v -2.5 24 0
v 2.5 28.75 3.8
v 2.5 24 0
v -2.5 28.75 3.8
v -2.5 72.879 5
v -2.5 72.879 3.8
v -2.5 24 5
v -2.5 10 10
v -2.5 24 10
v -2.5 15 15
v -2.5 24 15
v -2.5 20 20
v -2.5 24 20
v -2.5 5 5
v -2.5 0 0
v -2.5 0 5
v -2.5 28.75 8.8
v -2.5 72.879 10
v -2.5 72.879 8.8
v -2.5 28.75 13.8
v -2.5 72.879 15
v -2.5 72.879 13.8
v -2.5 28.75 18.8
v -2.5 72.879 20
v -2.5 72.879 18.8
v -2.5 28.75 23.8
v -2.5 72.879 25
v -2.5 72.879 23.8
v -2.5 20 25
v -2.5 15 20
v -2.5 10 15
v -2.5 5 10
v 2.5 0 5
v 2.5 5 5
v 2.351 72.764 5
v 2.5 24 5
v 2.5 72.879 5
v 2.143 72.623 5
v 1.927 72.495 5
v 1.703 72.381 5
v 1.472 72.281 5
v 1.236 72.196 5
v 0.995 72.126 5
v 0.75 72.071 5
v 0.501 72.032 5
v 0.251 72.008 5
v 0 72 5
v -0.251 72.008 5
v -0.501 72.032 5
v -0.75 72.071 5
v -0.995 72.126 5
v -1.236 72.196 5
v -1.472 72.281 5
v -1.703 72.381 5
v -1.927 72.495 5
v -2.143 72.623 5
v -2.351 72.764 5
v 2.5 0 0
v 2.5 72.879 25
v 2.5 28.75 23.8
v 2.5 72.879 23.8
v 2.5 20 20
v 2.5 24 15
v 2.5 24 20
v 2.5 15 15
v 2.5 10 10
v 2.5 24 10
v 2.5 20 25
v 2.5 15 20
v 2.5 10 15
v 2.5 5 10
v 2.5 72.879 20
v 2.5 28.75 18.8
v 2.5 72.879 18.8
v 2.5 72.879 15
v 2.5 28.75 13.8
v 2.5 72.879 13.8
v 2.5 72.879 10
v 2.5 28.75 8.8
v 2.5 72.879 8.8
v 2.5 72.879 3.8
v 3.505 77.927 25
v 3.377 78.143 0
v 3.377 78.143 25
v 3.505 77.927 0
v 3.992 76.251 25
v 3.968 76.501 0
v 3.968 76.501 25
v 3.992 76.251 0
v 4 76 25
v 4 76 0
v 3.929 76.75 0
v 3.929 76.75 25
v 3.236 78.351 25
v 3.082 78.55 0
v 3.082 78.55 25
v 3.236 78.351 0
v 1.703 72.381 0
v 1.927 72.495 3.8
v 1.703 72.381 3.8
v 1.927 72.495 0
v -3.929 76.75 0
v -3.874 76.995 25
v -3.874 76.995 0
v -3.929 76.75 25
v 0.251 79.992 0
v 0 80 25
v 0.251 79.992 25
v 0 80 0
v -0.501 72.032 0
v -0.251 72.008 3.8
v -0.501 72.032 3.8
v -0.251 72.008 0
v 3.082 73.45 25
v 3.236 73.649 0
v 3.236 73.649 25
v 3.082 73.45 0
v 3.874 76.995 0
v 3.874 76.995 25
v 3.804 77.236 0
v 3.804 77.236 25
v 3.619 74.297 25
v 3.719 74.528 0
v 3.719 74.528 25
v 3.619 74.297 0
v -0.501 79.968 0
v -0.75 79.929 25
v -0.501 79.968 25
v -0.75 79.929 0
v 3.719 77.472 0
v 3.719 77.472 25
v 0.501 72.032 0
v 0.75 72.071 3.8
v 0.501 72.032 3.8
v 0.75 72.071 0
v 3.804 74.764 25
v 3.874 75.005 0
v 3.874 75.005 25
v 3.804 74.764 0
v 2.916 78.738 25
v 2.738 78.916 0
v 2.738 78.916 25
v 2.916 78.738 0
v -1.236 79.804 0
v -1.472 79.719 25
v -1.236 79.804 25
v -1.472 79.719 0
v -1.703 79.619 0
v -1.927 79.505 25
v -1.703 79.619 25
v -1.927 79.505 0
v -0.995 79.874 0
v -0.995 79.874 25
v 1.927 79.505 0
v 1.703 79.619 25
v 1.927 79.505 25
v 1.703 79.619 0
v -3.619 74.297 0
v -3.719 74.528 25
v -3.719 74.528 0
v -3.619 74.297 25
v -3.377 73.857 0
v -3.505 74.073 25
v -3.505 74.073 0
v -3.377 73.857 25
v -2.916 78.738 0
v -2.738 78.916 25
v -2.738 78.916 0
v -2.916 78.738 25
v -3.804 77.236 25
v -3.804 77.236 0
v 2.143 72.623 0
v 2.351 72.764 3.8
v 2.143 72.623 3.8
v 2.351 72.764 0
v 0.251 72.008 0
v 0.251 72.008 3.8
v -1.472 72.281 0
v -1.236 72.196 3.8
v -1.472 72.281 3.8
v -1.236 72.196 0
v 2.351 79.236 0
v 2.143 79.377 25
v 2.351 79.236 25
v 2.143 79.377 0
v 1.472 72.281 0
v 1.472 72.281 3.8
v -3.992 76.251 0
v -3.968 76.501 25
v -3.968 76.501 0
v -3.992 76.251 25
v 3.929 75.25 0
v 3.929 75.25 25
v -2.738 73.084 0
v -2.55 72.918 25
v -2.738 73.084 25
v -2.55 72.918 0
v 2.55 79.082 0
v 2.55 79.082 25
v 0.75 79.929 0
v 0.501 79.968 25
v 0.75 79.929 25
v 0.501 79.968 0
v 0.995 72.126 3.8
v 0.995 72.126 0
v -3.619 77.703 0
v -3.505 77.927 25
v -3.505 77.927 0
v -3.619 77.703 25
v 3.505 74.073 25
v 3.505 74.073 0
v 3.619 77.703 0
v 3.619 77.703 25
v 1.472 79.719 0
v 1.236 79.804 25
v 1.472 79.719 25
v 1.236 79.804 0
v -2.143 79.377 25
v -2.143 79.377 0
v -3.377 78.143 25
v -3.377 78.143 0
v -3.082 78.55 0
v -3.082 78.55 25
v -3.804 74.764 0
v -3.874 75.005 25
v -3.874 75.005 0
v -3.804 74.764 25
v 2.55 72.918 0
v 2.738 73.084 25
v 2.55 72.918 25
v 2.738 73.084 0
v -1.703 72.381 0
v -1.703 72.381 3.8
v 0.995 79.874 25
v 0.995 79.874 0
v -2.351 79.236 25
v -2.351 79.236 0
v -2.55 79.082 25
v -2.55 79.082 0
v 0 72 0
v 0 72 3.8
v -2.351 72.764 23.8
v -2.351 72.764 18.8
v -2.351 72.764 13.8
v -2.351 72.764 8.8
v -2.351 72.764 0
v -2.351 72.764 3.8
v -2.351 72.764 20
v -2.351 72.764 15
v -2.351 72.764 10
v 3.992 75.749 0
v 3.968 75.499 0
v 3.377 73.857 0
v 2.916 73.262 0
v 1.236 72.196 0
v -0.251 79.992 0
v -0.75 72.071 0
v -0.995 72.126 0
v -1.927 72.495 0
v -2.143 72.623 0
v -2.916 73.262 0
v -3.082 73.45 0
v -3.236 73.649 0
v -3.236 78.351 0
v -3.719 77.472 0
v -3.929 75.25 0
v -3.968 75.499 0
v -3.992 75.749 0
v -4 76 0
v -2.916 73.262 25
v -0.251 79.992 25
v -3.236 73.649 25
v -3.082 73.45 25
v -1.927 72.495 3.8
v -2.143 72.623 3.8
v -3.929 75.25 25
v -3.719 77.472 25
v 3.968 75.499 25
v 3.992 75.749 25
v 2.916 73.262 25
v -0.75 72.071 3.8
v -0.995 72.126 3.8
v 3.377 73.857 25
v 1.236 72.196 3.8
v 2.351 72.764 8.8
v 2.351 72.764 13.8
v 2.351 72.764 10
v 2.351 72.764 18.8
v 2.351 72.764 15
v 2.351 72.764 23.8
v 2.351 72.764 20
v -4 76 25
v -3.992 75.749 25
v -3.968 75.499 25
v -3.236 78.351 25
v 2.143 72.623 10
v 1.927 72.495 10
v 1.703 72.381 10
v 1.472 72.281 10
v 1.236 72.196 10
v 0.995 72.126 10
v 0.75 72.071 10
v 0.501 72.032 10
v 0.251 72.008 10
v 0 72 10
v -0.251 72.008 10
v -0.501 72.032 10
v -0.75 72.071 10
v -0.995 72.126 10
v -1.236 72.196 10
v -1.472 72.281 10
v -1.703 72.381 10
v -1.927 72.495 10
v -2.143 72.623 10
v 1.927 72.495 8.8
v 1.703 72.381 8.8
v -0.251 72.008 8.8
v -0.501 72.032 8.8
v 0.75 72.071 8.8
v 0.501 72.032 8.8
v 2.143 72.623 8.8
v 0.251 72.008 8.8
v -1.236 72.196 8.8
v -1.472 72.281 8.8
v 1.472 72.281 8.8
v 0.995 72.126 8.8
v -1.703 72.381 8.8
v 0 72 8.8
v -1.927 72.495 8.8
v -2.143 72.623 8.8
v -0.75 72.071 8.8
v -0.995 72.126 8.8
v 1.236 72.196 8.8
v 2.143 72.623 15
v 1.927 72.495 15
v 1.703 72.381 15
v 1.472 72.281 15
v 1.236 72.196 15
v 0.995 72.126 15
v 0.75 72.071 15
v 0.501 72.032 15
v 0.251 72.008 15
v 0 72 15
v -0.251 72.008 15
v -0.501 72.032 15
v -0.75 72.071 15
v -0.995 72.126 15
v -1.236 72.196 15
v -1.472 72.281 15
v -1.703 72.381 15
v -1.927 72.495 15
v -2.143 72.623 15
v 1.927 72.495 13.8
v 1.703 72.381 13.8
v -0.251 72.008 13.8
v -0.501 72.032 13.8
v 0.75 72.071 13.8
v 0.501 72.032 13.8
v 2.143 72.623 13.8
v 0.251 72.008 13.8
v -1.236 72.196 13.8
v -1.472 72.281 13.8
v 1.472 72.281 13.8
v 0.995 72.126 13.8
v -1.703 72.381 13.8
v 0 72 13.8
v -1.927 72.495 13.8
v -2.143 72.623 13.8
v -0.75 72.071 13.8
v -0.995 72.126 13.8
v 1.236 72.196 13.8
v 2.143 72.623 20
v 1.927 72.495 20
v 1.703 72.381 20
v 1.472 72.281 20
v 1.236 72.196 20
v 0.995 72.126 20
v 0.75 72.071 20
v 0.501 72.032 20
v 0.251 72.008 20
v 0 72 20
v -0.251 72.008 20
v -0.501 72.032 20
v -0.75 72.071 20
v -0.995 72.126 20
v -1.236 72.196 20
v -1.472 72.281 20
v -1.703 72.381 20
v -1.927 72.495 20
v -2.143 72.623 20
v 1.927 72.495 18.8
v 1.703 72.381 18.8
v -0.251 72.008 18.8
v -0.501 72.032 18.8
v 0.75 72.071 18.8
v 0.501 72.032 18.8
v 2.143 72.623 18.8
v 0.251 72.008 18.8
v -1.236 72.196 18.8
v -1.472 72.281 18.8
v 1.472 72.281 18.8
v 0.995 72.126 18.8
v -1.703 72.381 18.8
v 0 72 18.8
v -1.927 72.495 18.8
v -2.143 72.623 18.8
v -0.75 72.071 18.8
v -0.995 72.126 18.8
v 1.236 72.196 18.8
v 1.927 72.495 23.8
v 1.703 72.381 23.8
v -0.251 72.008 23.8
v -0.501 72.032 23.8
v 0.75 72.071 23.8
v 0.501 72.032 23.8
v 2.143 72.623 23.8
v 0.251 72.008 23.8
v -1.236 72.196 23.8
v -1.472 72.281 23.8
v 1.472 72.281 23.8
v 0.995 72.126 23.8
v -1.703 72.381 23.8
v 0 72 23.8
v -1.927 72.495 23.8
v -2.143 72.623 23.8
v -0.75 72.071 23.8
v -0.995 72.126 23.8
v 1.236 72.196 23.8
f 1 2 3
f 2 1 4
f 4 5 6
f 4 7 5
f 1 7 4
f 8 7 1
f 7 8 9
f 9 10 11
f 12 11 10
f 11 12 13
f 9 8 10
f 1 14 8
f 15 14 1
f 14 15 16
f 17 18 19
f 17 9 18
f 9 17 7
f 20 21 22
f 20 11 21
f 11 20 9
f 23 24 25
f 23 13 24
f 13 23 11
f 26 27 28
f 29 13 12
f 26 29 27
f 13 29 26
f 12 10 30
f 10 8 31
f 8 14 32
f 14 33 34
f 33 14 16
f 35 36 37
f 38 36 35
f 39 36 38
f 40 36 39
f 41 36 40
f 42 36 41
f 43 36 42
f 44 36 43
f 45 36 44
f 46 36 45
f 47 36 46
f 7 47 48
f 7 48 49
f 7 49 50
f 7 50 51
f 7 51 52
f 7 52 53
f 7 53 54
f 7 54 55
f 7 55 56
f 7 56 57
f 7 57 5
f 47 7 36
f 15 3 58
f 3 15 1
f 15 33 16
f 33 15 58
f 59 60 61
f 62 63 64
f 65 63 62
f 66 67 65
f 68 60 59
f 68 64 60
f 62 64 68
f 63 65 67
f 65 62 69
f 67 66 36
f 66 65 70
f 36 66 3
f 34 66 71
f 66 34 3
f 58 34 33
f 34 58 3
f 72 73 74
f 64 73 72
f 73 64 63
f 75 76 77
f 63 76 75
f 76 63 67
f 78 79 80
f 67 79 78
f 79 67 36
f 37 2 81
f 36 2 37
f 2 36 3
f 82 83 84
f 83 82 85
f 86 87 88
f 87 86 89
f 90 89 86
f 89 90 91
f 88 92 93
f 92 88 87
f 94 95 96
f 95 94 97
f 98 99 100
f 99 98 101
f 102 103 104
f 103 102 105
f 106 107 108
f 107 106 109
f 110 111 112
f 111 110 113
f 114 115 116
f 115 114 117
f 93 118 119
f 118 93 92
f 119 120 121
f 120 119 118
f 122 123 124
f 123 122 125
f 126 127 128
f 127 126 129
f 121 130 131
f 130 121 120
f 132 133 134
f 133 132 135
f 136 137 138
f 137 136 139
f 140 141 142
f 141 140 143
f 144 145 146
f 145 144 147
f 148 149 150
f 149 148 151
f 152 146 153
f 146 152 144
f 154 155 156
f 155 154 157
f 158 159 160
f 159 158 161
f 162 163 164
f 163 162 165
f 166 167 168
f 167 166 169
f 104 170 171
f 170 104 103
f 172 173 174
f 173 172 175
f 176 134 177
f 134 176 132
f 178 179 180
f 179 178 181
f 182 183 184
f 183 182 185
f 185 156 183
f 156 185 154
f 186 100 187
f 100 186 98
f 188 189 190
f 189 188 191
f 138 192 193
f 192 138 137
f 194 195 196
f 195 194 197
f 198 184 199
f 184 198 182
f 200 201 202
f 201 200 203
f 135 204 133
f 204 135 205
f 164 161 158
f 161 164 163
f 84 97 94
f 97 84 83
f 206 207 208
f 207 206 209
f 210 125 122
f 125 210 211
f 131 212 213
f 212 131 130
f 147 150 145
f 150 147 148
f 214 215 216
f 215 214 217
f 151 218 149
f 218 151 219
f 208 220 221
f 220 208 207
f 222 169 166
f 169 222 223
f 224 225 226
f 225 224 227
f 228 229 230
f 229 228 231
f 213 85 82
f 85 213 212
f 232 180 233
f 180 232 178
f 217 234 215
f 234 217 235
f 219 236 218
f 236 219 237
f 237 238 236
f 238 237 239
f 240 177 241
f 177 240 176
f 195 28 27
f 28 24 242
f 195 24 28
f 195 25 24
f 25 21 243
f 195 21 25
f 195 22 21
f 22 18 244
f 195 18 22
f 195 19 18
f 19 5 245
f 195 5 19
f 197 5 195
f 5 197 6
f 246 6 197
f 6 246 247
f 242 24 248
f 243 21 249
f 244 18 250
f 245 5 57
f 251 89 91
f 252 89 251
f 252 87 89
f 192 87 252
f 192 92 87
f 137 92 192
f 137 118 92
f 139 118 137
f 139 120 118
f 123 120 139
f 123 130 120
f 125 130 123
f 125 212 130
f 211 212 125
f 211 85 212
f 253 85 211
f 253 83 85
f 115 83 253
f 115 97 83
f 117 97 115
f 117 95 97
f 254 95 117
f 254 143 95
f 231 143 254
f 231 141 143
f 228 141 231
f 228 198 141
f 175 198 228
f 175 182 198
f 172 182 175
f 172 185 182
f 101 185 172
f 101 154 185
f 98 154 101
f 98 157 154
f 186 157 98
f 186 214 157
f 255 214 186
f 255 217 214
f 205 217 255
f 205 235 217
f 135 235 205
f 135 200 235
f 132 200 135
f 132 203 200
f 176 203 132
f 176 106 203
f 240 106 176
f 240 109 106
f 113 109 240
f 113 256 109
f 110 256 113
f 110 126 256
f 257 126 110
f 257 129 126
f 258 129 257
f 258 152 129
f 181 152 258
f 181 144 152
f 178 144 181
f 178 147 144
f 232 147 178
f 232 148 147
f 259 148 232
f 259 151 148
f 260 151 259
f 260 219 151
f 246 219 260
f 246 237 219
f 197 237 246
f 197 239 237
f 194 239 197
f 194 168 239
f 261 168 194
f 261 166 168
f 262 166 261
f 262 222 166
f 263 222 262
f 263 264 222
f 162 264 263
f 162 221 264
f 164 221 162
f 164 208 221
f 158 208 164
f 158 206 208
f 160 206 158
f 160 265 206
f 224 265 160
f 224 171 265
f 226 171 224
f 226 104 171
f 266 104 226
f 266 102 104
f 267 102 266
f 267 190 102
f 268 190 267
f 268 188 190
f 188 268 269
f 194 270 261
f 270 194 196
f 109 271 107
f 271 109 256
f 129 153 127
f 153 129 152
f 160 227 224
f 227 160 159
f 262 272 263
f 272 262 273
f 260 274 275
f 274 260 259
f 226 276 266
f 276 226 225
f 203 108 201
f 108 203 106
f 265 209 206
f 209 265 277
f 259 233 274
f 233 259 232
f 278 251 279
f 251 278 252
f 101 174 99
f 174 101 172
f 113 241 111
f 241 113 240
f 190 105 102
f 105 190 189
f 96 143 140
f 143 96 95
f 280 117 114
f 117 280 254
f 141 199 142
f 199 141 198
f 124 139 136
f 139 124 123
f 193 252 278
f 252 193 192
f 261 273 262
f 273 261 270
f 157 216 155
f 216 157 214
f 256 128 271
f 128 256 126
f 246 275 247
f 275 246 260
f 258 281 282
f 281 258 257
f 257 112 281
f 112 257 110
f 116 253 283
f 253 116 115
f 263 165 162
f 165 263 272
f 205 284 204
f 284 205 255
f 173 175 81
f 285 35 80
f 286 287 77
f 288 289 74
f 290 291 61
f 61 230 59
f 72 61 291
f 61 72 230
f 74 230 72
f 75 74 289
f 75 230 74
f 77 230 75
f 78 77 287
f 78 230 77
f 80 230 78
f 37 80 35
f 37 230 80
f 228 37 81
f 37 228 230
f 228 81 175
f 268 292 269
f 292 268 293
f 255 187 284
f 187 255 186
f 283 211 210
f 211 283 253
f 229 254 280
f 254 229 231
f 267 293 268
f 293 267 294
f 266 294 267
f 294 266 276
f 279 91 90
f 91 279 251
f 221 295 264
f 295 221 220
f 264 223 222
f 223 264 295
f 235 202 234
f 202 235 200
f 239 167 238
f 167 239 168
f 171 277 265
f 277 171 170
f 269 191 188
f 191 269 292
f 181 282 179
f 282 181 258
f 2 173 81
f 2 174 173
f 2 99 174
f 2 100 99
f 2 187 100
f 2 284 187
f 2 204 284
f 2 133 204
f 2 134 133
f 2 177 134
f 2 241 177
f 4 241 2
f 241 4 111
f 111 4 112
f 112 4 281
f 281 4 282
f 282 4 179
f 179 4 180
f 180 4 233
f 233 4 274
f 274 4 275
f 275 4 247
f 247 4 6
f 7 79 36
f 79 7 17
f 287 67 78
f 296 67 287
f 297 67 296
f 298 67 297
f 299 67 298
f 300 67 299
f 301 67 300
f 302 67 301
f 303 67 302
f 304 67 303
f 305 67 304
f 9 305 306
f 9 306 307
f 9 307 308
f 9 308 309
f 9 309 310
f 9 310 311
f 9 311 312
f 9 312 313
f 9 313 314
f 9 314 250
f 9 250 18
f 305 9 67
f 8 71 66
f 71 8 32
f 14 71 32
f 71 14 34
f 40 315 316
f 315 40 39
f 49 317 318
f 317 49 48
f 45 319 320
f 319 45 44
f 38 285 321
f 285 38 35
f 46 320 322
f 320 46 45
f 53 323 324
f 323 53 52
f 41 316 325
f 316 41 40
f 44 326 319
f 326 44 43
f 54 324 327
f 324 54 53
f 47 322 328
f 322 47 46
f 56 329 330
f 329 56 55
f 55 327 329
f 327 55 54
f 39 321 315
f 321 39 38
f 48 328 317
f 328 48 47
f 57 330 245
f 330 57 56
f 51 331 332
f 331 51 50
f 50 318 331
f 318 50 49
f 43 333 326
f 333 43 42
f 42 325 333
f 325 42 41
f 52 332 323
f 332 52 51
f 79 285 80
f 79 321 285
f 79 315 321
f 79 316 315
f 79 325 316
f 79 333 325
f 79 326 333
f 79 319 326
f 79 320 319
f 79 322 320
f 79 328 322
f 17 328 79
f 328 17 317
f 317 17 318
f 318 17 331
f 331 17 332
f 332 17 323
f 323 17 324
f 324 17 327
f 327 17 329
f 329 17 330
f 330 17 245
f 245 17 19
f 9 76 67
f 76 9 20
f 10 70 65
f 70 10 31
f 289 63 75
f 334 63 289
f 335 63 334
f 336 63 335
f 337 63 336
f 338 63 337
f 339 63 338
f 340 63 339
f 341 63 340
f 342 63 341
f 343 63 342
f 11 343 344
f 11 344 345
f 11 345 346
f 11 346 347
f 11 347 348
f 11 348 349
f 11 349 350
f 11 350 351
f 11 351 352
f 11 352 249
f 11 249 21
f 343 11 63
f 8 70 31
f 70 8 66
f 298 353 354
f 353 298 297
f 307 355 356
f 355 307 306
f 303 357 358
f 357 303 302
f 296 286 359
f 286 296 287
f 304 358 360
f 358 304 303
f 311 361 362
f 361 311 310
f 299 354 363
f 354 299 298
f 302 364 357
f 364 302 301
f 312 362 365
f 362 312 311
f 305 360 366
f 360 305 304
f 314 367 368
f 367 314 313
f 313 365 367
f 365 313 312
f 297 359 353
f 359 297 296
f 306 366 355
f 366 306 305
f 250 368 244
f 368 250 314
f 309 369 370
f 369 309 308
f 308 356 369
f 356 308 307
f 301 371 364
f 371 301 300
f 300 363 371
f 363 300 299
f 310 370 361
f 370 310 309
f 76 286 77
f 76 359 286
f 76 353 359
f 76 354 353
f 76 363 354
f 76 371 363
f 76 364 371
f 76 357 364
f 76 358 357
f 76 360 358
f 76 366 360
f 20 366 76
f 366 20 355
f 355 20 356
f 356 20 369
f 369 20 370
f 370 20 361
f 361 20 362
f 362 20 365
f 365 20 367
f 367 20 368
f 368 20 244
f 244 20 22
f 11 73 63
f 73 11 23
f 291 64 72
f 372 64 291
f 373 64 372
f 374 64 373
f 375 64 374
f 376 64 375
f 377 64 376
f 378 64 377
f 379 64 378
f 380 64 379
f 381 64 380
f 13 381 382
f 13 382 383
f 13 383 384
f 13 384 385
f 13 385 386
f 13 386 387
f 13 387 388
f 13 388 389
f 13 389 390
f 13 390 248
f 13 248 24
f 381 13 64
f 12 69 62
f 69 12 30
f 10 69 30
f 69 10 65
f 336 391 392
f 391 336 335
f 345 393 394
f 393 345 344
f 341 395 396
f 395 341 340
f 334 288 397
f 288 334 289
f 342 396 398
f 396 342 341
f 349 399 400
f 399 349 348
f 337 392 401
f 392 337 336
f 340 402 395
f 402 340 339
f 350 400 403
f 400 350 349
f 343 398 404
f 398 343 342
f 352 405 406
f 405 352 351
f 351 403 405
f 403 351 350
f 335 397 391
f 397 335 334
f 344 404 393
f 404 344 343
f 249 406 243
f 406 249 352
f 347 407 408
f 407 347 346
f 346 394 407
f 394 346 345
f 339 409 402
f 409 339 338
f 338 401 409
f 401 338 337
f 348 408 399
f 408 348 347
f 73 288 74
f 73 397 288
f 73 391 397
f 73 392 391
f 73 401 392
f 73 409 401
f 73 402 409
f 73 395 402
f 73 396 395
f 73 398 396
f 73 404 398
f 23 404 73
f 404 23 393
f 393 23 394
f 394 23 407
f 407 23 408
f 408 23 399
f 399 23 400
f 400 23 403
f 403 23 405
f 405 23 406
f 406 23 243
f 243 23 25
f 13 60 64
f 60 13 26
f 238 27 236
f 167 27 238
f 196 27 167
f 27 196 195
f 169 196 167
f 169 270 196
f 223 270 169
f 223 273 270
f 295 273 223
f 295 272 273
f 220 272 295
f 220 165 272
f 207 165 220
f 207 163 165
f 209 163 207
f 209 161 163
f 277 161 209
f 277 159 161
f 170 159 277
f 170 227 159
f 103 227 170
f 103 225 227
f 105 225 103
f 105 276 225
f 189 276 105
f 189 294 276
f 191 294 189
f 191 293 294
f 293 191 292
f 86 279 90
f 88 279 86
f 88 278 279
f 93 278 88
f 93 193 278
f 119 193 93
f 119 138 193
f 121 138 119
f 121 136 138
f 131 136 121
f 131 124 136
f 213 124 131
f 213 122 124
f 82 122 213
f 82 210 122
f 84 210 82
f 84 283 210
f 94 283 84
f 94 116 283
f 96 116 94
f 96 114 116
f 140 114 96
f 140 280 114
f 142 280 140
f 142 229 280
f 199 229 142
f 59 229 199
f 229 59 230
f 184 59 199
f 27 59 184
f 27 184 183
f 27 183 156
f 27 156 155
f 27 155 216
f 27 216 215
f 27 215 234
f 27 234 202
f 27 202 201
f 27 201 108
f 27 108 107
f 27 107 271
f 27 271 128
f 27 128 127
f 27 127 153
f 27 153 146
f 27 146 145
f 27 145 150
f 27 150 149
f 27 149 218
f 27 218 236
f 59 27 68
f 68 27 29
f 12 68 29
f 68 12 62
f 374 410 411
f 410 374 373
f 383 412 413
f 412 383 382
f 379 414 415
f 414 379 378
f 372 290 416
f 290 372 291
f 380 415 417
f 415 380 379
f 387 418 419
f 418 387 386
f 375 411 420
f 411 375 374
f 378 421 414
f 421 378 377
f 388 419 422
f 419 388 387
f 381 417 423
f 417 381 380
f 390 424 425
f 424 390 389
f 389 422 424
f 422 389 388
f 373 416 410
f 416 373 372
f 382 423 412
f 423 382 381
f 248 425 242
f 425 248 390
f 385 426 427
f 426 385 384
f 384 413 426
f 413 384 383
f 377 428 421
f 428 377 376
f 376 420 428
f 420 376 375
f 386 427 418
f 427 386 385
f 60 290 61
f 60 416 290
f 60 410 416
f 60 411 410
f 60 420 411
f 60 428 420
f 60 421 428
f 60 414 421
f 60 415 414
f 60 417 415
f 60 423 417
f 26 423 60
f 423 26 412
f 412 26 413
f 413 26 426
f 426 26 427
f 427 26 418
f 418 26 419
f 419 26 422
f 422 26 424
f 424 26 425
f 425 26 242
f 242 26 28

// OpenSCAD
$fn=100;

ht=5;
l=80;
w=5;
d1=8;
d2=6;
q=5;

translate([0,-1,-1])
for(i=[1:ht:ht*q]){
    difference(){
        union(){
            hull(){
                translate([-w/2,i,i])
                cube([w,ht*q-i,ht]);
                
                translate([-w/2,i,i+ht-1])
                cube([w,ht*q-i+ht,1]);
            }
            translate([0,l-d1/2+1,i])
            cylinder(d=d1,h=ht);

            translate([-w/2,i,i+ht-1.2])
            cube([w,l-i-d1/2,1.2]);
        }

    }    
}
